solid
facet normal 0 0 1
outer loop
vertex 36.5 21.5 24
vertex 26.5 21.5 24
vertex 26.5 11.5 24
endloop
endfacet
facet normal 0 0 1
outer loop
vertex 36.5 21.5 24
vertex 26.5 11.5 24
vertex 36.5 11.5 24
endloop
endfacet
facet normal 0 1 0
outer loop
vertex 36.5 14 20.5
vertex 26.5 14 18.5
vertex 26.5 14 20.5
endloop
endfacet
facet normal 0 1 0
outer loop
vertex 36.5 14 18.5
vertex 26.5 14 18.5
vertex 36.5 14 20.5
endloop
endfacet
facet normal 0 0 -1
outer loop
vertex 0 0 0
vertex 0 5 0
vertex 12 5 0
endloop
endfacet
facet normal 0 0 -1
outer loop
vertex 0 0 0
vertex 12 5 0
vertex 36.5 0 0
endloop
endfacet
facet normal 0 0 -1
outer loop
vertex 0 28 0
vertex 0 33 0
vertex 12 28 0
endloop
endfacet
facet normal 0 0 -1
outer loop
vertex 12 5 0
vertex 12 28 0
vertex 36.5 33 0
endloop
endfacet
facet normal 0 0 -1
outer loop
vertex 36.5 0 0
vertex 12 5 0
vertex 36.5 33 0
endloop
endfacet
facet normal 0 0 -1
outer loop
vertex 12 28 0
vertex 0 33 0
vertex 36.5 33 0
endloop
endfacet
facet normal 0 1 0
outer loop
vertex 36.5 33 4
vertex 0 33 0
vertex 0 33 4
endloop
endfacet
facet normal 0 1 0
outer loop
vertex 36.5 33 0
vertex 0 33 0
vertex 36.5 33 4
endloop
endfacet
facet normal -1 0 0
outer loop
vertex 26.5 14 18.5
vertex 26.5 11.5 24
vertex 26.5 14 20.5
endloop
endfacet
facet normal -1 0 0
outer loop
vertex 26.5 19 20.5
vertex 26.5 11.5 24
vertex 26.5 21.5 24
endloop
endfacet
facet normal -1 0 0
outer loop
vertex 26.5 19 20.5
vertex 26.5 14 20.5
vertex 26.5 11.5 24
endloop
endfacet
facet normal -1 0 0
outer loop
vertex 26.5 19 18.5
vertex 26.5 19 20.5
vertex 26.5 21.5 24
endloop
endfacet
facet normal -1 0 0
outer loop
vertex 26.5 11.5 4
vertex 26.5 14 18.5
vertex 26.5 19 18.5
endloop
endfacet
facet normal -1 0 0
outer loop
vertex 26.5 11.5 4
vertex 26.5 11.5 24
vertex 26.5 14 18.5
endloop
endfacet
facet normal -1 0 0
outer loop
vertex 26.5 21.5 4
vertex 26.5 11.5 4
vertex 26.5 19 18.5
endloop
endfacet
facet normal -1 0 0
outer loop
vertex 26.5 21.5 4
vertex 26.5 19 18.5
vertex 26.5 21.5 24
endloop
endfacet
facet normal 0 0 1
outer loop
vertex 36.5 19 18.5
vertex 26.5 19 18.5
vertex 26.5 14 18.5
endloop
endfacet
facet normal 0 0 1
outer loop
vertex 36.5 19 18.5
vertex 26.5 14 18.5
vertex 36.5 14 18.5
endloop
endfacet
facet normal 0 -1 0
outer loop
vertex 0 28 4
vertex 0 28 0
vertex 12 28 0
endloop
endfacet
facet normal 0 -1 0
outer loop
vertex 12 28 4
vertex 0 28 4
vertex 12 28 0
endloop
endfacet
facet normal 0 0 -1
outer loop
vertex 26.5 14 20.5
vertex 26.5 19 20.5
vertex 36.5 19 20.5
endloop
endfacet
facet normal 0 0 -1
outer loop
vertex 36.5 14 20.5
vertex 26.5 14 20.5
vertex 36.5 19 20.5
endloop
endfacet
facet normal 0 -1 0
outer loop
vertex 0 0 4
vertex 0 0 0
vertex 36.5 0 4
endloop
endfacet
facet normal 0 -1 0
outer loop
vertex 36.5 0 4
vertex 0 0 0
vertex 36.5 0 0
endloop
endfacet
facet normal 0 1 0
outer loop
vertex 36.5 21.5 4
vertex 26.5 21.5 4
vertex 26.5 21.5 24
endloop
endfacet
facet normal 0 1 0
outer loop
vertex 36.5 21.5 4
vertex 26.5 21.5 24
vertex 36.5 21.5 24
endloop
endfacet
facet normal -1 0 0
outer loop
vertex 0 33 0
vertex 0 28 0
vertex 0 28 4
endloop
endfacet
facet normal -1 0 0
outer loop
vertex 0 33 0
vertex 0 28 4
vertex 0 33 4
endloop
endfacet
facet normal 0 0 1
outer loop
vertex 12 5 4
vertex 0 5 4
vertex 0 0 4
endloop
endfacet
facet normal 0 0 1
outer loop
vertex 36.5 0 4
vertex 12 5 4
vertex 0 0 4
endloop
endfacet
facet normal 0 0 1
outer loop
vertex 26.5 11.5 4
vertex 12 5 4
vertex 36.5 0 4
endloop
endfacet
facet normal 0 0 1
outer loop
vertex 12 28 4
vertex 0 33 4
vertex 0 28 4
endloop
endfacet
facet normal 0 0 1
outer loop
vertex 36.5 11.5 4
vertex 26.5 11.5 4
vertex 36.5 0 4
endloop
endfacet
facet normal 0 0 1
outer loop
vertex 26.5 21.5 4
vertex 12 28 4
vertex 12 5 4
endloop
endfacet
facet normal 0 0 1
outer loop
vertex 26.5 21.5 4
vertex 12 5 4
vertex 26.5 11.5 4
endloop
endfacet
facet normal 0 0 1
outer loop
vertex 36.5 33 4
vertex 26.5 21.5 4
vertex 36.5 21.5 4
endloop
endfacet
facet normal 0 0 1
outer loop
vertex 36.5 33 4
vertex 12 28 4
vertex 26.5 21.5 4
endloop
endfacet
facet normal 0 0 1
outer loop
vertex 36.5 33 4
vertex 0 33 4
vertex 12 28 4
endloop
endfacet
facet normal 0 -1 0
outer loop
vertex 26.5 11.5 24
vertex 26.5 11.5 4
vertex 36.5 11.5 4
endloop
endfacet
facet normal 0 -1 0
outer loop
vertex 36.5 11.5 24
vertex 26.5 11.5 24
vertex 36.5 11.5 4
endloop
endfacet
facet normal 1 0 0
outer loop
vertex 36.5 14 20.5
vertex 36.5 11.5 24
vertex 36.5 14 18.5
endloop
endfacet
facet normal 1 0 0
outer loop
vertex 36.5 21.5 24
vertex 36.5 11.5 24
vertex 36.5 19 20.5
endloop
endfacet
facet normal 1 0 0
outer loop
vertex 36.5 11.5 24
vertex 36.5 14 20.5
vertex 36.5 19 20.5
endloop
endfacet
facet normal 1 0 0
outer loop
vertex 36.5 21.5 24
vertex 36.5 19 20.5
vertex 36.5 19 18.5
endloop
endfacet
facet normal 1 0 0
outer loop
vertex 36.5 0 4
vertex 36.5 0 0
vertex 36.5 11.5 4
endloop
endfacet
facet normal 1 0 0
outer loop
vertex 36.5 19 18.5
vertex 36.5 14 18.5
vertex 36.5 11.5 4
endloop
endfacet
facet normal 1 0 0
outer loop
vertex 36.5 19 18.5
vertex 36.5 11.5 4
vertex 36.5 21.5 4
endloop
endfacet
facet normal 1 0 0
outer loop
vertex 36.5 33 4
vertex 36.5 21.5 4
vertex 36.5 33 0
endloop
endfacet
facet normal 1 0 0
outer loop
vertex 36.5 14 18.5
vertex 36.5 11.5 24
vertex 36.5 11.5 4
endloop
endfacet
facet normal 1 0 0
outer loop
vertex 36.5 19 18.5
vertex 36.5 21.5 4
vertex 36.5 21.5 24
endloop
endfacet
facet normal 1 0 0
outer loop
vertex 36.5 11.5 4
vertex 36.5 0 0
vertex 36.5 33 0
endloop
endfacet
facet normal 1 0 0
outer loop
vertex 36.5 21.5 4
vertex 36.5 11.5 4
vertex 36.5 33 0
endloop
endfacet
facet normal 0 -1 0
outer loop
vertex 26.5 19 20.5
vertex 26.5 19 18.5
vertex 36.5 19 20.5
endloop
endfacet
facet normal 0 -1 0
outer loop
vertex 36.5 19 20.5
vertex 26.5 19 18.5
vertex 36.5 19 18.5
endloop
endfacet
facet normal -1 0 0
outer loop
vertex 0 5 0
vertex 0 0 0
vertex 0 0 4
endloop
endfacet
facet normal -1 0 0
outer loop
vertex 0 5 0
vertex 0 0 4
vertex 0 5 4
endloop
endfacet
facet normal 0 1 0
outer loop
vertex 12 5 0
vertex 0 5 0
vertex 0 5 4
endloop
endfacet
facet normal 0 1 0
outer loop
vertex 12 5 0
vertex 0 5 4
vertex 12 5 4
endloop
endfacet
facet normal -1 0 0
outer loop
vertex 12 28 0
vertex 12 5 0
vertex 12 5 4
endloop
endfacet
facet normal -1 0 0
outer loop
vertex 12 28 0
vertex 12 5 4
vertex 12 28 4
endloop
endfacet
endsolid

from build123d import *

# Parameters (mm, degrees)
BOX003_W     = 10
BOX003_H     = 5
BOX003_DEPTH = 2
BOX001_W     = 10
BOX001_H     = 10
BOX001_DEPTH = 20
BOX002_W     = 12
BOX002_H     = 23
BOX002_DEPTH = 4
BOX_W        = 36.5
BOX_H        = 33
BOX_DEPTH    = 4


with BuildPart() as box003:
    # Box003 → Box003 (new body)
    with BuildSketch(Plane(origin=(26.5, 14, 18.5), x_dir=(1, 0, 0), z_dir=(0, 0, 1))):
        with Locations((5, 2.5)):
            Rectangle(BOX003_W, BOX003_H)
    extrude(amount=BOX003_DEPTH)


with BuildPart() as cut001:
    # Box001 → Box001 (new body)
    with BuildSketch(Plane(origin=(26.5, 11.5, 4), x_dir=(1, 0, 0), z_dir=(0, 0, 1))):
        with Locations((5, 5)):
            Rectangle(BOX001_W, BOX001_H)
    extrude(amount=BOX001_DEPTH)

    # Cut001: cut Box003
    add(box003.part, mode=Mode.SUBTRACT)


with BuildPart() as box002:
    # Box002 → Box002 (new body)
    with BuildSketch(Plane(origin=(0, 5, 0), x_dir=(1, 0, 0), z_dir=(0, 0, 1))):
        with Locations((6, 11.5)):
            Rectangle(BOX002_W, BOX002_H)
    extrude(amount=BOX002_DEPTH)


with BuildPart() as fusion:
    # Box → Box (new body)
    with BuildSketch(Plane.XY):
        with Locations((18.25, 16.5)):
            Rectangle(BOX_W, BOX_H)
    extrude(amount=BOX_DEPTH)

    # Cut: cut Box002
    add(box002.part, mode=Mode.SUBTRACT)

    # Fusion: union Cut001
    add(cut001.part)


solid = fusion.part
